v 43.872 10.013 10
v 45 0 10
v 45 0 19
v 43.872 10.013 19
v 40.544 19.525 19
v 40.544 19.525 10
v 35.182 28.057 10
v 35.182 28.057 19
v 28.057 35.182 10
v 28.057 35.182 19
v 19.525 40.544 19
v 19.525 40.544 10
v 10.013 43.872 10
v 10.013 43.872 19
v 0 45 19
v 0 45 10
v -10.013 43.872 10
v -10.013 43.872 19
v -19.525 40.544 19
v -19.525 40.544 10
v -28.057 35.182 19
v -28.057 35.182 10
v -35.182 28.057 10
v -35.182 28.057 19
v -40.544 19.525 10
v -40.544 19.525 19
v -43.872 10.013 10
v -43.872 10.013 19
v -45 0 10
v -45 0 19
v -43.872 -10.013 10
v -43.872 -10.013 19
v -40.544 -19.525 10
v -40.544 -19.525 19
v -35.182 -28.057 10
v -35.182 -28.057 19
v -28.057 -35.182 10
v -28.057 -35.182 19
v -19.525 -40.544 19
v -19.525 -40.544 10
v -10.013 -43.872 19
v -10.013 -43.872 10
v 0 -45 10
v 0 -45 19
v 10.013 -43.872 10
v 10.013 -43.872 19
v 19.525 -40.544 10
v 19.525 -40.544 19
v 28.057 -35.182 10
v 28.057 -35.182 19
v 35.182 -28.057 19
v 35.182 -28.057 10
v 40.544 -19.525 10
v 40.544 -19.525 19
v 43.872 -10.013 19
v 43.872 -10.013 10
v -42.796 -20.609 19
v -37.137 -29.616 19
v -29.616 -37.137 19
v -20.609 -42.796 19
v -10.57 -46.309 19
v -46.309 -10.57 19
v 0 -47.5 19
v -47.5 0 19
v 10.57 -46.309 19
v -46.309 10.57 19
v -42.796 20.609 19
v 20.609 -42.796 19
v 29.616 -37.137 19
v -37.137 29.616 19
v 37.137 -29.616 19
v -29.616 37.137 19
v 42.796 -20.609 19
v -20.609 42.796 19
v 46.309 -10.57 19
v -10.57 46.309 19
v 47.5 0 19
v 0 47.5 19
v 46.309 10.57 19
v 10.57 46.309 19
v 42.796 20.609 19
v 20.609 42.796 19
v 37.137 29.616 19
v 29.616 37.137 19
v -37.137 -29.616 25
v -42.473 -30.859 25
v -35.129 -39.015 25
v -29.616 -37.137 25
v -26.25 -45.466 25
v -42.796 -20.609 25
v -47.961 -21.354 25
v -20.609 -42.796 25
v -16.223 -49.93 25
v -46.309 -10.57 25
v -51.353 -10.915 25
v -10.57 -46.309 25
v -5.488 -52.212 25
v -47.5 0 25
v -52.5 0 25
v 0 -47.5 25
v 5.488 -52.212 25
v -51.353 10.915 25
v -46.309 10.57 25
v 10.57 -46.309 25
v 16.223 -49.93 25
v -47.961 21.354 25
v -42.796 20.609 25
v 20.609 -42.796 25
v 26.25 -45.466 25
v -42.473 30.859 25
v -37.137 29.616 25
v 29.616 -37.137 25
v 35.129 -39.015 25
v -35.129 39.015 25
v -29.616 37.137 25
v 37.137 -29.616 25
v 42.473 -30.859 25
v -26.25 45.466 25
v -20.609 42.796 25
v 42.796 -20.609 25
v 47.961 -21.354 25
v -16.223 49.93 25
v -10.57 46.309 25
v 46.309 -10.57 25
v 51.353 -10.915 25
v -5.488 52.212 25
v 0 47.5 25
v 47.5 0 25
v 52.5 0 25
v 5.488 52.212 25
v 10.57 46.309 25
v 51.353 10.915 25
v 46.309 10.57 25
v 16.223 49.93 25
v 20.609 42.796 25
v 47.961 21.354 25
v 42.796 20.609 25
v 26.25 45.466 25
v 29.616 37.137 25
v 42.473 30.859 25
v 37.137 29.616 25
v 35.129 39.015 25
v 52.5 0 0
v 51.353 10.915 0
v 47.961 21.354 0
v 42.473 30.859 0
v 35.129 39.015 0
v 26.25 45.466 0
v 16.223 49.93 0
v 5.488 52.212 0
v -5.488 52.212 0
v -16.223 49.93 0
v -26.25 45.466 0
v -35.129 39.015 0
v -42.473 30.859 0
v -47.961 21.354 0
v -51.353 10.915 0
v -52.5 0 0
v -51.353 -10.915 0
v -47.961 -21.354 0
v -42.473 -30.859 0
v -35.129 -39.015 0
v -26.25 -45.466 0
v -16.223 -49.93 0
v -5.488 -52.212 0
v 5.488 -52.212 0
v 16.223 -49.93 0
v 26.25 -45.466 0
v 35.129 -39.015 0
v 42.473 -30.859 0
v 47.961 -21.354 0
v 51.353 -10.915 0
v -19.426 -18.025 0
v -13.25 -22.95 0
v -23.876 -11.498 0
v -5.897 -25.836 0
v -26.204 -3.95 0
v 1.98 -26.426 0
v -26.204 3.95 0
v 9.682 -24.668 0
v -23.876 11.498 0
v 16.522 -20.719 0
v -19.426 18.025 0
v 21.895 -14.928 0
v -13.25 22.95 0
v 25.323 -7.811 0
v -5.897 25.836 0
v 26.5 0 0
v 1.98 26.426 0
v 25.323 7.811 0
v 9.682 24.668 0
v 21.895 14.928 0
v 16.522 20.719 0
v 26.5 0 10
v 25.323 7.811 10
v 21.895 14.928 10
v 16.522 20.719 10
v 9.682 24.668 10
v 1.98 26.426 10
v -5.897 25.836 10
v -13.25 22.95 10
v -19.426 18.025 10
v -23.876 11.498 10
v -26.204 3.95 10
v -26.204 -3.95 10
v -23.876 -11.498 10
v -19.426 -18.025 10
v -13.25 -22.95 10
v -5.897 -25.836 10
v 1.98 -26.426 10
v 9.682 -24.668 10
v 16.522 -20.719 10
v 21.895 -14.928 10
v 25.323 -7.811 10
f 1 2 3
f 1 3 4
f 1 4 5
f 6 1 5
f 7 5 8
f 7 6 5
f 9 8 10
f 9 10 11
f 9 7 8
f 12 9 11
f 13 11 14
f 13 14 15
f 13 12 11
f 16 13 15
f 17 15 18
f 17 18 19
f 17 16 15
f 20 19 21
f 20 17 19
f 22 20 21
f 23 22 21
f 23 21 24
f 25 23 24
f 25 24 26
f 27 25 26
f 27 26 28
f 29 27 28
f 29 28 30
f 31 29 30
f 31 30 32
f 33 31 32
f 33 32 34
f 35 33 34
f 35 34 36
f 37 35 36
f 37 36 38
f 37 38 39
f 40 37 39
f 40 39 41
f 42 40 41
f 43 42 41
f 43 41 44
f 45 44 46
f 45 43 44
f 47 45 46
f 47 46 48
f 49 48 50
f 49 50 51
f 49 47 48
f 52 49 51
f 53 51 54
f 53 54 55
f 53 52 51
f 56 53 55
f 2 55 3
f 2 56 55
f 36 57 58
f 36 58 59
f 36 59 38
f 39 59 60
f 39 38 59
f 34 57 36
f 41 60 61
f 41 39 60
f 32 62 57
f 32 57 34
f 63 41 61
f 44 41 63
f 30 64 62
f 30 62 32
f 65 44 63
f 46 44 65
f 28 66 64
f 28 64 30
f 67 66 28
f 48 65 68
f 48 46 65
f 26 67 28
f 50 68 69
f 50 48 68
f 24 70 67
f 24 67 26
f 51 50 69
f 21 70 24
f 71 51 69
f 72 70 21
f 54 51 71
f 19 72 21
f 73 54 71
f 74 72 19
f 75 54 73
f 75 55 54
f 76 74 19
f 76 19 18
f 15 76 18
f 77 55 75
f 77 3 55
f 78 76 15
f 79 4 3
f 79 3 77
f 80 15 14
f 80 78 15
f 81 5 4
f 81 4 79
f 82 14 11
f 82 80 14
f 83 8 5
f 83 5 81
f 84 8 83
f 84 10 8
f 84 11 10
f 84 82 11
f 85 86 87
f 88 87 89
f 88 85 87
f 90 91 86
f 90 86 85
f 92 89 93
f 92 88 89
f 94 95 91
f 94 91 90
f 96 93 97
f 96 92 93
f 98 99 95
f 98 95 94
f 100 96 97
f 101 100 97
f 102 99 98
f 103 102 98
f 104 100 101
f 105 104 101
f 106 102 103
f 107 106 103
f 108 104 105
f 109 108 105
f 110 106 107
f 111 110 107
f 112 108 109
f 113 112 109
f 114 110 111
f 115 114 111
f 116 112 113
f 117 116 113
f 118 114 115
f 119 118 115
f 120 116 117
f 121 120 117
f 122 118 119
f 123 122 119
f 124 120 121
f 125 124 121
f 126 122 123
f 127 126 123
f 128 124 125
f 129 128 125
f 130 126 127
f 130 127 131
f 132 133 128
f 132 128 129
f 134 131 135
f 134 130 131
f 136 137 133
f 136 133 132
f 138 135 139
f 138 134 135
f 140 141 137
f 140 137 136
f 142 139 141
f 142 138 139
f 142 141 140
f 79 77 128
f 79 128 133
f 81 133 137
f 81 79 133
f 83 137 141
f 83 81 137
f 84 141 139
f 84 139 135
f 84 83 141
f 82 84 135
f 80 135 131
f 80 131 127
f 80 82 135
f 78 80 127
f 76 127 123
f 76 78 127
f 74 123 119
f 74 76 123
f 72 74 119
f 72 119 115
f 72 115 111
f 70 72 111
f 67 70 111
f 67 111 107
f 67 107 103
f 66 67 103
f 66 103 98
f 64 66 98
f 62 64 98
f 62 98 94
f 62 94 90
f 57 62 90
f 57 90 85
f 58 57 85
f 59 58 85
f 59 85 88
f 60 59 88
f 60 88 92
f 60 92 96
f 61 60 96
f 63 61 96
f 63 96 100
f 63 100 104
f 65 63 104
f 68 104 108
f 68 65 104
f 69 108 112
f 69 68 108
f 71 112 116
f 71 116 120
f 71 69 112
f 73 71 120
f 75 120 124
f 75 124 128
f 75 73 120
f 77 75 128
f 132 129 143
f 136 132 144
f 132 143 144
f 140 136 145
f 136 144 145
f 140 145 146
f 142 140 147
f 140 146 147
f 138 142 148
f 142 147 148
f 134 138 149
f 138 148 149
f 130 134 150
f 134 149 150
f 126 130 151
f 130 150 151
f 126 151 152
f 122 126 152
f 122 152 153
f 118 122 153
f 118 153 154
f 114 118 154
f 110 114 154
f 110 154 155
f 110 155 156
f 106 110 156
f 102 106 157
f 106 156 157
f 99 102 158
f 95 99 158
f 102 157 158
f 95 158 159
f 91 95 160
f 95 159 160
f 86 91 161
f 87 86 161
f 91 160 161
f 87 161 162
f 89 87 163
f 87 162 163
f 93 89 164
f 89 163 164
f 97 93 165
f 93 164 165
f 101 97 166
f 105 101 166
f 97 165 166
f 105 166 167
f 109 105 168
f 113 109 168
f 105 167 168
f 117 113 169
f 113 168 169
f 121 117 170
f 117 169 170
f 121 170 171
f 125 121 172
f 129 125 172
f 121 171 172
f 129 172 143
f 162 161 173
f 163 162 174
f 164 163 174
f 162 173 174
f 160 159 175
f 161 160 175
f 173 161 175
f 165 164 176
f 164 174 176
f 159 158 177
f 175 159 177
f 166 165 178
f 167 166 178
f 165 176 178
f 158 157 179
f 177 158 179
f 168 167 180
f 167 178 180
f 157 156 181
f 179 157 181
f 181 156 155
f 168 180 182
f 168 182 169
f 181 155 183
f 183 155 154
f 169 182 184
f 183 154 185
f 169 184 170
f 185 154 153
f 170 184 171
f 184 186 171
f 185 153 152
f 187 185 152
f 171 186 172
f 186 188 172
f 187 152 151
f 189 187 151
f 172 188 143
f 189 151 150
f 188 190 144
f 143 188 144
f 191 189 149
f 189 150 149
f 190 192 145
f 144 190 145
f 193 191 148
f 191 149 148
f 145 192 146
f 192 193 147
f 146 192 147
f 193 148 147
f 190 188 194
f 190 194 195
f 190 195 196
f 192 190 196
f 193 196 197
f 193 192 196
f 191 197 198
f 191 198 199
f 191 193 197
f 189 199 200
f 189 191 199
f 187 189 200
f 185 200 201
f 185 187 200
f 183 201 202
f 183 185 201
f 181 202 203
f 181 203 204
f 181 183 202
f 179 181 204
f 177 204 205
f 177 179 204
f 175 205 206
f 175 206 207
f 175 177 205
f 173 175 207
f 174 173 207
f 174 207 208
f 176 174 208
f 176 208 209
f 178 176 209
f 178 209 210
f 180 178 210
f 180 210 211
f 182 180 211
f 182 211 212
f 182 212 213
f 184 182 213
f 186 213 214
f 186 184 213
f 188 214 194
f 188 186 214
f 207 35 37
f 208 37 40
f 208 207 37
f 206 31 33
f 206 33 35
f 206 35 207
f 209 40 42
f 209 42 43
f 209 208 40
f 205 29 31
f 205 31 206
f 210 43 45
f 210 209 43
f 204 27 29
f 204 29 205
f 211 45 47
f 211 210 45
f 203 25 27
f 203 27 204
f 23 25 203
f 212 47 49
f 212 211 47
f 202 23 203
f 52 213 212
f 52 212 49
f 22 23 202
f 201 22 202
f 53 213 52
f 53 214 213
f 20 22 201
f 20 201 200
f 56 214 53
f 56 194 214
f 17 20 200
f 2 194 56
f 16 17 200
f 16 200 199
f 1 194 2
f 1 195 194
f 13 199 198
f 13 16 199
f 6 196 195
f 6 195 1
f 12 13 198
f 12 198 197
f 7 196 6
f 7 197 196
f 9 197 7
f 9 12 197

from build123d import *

# Parameters (mm, degrees)
SKETCH2_R           = 52.5
SKETCH2_R_2         = 47.5
BOSS_EXTRUDE1_DEPTH = 25
SKETCH2_6_R         = 47.5
SKETCH2_6_R_2       = 45
BOSS_EXTRUDE5_DEPTH = 19
SKETCH2_7_R         = 45
SKETCH2_7_R_2       = 26.5
BOSS_EXTRUDE6_DEPTH = 10


with BuildPart() as part:
    # Sketch2 → Boss-Extrude1 (new body)
    with BuildSketch(Plane.XY):
        Circle(SKETCH2_R)
        Circle(SKETCH2_R_2, mode=Mode.SUBTRACT)
    extrude(amount=BOSS_EXTRUDE1_DEPTH)

    # Sketch2<6> → Boss-Extrude5 (add)
    with BuildSketch(Plane.XY):
        Circle(SKETCH2_6_R)
        Circle(SKETCH2_6_R_2, mode=Mode.SUBTRACT)
    extrude(amount=BOSS_EXTRUDE5_DEPTH)

    # Sketch2<7> → Boss-Extrude6 (add)
    with BuildSketch(Plane.XY):
        Circle(SKETCH2_7_R)
        Circle(SKETCH2_7_R_2, mode=Mode.SUBTRACT)
    extrude(amount=BOSS_EXTRUDE6_DEPTH)


solid = part.part
